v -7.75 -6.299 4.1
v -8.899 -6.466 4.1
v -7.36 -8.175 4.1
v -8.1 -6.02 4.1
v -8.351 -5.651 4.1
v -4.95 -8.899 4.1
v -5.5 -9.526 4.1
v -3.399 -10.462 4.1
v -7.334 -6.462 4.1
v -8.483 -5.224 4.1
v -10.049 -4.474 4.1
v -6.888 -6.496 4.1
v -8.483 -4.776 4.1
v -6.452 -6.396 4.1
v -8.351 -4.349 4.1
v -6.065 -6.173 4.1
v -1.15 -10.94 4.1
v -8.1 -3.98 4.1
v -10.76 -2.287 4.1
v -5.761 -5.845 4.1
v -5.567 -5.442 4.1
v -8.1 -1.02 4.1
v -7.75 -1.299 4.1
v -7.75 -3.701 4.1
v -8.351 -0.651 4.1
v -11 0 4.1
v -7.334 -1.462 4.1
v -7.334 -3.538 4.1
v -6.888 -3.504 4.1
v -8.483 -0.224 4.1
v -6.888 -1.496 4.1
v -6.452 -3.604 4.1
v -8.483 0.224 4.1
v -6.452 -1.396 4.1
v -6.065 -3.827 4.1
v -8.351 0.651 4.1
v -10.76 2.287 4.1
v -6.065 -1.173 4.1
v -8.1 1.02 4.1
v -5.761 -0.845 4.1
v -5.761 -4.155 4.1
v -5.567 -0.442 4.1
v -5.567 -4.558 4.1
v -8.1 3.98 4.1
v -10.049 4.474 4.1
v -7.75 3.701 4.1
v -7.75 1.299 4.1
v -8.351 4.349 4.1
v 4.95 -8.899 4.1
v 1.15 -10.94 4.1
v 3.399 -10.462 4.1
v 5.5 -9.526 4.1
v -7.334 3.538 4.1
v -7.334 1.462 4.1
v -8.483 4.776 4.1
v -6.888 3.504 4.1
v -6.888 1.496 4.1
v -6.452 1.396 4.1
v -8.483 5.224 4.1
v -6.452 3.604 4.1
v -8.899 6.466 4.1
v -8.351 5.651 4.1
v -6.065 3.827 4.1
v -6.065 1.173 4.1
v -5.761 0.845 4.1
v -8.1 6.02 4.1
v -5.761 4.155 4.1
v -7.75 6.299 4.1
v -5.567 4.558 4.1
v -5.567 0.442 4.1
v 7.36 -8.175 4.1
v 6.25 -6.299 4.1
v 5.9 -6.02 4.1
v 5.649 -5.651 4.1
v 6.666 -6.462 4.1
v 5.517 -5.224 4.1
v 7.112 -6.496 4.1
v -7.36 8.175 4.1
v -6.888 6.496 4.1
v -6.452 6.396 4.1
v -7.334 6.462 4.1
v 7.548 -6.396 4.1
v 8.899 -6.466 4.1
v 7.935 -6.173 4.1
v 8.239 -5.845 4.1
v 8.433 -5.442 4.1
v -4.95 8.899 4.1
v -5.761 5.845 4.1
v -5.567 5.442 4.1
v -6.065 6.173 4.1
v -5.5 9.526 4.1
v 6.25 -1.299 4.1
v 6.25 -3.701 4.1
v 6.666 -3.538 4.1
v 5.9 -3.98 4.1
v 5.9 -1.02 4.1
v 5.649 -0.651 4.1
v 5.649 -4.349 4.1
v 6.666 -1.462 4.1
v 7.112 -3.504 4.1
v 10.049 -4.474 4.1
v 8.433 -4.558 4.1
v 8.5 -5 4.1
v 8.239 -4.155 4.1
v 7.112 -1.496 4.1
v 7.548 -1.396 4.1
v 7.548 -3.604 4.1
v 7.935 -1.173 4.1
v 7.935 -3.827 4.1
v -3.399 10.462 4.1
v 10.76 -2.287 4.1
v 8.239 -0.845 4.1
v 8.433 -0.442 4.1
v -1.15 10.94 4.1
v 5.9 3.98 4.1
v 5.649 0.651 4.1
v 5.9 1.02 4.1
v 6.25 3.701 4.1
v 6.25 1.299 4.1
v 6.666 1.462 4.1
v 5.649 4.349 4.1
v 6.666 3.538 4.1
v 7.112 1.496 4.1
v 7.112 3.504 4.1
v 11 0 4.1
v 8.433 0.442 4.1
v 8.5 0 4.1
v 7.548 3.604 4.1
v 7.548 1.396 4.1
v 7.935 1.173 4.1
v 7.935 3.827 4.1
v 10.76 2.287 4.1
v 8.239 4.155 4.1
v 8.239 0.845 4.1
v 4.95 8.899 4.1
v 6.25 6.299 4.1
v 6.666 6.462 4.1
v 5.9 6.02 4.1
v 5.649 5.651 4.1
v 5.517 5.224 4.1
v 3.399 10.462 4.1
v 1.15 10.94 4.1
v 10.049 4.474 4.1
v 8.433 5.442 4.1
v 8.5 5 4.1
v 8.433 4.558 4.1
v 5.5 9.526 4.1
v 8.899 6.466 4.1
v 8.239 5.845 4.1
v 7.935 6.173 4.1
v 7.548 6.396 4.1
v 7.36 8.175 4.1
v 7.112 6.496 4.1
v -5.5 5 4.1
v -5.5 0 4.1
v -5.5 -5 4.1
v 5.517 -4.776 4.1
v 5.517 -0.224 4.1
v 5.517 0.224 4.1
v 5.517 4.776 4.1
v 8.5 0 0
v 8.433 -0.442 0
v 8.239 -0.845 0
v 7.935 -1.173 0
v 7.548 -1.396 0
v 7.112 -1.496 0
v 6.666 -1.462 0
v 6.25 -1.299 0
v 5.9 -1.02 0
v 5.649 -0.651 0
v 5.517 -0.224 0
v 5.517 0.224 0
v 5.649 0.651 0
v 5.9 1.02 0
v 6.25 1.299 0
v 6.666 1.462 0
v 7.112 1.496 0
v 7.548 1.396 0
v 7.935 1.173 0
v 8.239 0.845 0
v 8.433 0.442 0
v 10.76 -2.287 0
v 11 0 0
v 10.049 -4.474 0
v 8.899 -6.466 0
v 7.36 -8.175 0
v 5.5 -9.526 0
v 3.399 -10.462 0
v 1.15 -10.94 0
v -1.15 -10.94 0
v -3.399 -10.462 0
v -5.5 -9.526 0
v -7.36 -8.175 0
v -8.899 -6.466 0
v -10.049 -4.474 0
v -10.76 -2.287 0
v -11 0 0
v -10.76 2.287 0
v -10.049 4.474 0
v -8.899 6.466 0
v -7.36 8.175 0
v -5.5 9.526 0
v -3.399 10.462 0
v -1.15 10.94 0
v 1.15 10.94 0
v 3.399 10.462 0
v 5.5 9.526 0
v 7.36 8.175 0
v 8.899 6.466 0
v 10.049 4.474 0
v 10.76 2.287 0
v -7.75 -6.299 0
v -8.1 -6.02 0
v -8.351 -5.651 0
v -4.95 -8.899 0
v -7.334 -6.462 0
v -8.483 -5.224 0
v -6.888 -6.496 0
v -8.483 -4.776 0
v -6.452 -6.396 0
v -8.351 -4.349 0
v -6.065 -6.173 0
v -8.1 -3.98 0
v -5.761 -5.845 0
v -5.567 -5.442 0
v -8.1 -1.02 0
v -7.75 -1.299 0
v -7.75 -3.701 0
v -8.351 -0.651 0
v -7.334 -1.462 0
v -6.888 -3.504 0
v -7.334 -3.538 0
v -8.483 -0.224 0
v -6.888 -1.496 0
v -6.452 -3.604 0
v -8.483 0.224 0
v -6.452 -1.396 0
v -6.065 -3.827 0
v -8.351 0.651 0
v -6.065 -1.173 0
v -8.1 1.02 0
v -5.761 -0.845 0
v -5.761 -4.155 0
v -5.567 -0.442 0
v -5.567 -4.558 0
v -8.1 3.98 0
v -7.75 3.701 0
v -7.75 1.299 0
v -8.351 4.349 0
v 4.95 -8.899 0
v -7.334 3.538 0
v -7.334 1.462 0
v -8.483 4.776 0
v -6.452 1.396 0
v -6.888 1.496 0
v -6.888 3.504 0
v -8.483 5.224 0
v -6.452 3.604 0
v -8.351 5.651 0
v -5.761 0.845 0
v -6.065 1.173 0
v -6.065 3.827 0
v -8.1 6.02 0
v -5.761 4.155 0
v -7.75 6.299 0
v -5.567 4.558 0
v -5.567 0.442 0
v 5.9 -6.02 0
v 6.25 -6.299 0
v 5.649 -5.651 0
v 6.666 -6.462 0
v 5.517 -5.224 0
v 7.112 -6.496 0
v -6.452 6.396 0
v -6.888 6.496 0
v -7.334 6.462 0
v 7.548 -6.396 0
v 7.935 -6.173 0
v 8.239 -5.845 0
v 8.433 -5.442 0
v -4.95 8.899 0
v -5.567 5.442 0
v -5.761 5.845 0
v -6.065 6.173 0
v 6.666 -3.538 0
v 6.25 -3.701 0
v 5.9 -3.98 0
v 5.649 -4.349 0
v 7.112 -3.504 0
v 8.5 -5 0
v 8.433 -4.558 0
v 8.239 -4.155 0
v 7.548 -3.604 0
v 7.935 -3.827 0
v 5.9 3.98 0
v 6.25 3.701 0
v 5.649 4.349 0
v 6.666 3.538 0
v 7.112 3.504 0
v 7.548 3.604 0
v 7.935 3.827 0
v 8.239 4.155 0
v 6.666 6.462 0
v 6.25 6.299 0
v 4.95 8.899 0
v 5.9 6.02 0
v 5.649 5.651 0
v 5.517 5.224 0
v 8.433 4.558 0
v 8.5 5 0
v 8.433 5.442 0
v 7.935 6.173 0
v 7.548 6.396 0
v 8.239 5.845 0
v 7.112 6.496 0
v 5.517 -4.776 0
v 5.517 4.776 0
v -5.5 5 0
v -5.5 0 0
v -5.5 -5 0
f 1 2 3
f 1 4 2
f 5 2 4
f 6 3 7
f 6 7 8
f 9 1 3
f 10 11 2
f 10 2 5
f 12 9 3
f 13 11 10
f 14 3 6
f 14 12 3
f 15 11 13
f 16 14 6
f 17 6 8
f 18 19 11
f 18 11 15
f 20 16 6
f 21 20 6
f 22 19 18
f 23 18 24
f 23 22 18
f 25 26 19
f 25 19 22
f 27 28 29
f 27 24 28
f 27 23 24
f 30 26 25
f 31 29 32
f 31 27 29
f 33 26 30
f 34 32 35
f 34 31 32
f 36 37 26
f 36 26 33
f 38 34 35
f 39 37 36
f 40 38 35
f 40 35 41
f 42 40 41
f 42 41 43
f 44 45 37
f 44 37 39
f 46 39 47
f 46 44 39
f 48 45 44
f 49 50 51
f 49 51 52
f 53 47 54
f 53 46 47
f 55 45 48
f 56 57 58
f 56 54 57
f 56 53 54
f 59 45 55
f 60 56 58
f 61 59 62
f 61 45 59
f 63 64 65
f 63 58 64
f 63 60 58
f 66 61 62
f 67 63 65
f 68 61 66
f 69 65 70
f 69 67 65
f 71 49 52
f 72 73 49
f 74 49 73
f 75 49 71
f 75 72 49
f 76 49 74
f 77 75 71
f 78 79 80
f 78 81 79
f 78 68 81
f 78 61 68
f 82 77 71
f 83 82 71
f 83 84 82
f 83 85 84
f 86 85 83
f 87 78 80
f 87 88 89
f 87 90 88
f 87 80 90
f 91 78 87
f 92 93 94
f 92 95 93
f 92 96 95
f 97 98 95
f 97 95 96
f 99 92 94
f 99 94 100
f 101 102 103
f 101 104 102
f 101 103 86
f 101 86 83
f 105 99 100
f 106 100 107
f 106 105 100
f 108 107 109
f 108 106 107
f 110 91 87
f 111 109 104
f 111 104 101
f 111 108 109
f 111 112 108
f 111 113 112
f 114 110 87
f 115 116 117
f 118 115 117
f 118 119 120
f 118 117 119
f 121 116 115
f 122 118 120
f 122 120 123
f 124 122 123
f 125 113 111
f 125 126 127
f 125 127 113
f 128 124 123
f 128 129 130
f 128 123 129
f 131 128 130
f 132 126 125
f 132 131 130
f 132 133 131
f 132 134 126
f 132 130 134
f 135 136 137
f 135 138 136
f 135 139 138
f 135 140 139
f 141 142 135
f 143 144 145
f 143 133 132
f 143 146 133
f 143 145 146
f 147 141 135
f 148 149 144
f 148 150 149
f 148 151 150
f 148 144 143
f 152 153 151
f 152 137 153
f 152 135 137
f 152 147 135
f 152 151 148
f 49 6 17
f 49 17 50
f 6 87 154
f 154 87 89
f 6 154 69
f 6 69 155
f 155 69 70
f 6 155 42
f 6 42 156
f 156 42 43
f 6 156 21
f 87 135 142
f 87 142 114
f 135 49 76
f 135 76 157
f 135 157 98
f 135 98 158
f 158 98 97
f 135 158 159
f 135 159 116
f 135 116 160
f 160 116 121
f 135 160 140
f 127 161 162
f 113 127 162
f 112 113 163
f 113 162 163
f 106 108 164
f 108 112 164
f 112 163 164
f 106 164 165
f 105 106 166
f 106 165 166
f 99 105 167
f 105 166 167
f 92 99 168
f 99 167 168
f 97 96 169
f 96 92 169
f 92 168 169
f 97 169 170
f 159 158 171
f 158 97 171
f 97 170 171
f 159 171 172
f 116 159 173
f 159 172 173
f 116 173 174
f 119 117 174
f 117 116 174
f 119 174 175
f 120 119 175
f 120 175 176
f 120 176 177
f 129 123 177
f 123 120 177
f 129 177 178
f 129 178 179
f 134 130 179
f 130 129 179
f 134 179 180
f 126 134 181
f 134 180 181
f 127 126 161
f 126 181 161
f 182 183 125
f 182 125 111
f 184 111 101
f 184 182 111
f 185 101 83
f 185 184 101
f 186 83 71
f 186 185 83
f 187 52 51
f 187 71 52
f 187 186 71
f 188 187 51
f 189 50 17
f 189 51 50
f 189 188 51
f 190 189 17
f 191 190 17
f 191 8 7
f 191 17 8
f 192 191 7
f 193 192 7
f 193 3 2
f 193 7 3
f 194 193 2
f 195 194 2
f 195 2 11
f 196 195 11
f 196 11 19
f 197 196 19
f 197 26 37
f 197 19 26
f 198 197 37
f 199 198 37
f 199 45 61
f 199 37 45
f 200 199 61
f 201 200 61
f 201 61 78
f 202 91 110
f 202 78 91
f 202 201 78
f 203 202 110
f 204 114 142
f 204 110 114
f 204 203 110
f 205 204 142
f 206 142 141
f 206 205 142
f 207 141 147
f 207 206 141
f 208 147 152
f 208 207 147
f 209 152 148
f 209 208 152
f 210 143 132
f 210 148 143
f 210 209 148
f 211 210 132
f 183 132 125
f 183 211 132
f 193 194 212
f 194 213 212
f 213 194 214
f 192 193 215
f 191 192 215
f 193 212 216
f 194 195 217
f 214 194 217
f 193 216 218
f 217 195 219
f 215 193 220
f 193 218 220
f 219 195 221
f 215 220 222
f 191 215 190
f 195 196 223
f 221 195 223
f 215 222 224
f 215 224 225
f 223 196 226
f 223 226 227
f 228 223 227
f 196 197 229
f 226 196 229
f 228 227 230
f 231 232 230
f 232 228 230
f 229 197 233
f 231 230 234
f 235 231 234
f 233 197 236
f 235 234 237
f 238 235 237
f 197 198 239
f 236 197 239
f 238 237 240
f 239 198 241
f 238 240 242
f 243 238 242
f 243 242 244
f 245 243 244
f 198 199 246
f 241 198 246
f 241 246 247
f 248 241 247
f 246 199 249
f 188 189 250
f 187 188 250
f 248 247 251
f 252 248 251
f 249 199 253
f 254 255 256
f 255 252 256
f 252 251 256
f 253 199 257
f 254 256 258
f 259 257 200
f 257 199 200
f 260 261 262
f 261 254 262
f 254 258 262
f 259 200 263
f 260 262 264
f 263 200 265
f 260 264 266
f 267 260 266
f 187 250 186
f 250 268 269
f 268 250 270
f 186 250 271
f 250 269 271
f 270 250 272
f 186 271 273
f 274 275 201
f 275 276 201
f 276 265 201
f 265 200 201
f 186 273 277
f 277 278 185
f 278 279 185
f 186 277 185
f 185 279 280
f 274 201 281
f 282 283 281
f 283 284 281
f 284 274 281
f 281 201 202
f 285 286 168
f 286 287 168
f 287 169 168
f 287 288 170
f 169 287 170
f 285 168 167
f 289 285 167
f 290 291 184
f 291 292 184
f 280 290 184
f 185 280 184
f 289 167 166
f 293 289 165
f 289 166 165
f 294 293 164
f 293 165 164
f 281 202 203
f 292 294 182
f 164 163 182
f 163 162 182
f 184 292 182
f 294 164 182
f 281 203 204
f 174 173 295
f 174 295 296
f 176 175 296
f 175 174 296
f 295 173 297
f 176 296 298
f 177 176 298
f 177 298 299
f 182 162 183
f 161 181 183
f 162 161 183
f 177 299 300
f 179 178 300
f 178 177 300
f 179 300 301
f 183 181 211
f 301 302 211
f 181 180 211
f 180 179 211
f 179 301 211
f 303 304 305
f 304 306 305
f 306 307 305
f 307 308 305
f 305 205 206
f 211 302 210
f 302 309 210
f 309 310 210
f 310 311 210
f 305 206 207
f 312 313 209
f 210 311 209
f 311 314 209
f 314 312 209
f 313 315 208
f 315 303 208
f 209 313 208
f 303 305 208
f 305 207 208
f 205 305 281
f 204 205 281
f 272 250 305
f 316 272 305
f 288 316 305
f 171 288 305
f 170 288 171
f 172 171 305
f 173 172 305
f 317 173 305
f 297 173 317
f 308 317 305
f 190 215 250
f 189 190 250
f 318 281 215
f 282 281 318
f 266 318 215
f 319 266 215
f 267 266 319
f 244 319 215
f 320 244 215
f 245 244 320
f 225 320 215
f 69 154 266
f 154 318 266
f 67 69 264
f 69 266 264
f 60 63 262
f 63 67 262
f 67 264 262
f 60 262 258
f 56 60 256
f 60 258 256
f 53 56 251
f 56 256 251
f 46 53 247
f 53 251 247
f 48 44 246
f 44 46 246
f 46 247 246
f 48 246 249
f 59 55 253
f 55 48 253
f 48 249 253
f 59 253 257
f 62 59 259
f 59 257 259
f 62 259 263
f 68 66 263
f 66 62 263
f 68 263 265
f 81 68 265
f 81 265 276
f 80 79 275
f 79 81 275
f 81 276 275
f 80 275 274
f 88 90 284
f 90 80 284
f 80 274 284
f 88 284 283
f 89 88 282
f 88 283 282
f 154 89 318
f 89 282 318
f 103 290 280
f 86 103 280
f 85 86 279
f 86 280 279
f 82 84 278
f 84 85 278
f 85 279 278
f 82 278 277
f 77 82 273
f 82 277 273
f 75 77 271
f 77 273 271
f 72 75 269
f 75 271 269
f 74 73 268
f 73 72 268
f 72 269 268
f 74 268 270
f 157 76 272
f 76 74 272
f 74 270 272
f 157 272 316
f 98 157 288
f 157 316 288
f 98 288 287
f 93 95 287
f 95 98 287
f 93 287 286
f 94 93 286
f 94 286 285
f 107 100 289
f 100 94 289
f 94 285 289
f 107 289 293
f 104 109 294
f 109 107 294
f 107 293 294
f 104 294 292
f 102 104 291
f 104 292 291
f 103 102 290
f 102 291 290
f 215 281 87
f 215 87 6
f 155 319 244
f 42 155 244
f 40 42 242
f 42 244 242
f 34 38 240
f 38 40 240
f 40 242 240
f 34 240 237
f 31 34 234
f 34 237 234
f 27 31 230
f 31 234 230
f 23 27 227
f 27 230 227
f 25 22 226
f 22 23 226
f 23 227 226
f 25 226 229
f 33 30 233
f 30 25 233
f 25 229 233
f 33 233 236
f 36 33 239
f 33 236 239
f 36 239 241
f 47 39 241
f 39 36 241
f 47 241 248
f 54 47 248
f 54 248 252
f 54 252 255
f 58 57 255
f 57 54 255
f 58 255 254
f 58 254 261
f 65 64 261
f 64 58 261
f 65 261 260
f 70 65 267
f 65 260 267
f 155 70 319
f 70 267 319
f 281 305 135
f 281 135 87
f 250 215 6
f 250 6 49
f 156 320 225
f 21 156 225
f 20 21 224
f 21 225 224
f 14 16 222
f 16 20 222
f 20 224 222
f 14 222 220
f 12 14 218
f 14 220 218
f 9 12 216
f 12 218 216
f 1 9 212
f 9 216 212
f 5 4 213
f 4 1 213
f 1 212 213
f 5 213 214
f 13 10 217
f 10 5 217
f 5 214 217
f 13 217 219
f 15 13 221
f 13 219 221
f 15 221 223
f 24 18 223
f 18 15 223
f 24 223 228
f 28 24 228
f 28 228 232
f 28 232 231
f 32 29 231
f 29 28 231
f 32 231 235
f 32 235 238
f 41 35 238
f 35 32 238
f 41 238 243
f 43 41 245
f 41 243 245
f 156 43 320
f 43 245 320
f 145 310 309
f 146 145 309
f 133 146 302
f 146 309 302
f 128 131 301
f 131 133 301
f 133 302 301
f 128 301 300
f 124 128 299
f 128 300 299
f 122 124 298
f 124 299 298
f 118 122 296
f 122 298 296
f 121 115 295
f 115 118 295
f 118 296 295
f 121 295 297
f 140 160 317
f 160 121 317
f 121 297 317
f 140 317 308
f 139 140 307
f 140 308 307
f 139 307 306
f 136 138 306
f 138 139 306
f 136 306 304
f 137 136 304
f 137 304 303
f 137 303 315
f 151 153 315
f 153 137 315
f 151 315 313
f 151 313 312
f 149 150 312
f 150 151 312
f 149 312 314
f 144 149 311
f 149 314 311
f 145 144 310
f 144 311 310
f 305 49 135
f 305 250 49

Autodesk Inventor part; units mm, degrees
ref_plane "YZ Plane" through (0, 0, 0) normal (1, 0, 0) x (0, 1, 0)
ref_plane "XZ Plane" through (0, 0, 0) normal (0, 1, 0) x (-1, 0, 0)
ref_plane "XY Plane" through (0, 0, 0) normal (0, 0, 1) x (1, 0, 0)
sketch "Sketch3" plane through (0, 0, 0) normal (0, 0, 1) x (1, 0, 0)
  line L0 (-15.8918, -16.7) -> (15.8918, -16.7)
  line L1 (16.7, -15.7) -> (16.7, 15.7)
  line L2 (15.8918, 16.7) -> (-15.8918, 16.7)
  line L3 (-16.7, 15.7) -> (-16.7, -15.7)
  line L4 (-15.8918, 16.7) -> (-16.7, 15.7)
  line L5 (15.8918, 16.7) -> (16.7, 15.7)
  line L6 (16.7, -15.7) -> (15.8918, -16.7)
  line L7 (-16.7, -15.7) -> (-15.8918, -16.7)
  line L8 (-4.9497, -8.8994) -> (4.9497, -8.8994)
  line L9 (4.9497, -8.8994) -> (4.9497, 8.8994)
  line L10 (4.9497, 8.8994) -> (-4.9497, 8.8994)
  line L11 (-4.9497, 8.8994) -> (-4.9497, -8.8994)
  circle A0 centre (-12.14, 12.625) radius 2.045
  circle A1 centre (12.14, 12.625) radius 2.045
  line L12 (0, -16.7) -> (0, 16.7) construction
  circle A2 centre (-12.14, -12.625) radius 2.045
  circle A3 centre (12.14, -12.625) radius 2.045
  line L13 (12.14, 12.625) -> (-12.14, 12.625) construction
  line L14 (-12.14, 12.625) -> (-12.14, -12.625) construction
  line L15 (-12.14, -12.625) -> (12.14, -12.625) construction
  line L16 (12.14, -12.625) -> (12.14, 12.625) construction
  line L17 (-16.7, 0) -> (16.7, 0) construction
  circle A4 centre (0, 0) radius 18.4 construction
  circle A5 centre (-7, 0) radius 1.5
  circle A6 centre (7, 0) radius 1.5
  circle A7 centre (-7, 5) radius 1.5
  circle A8 centre (7, 5) radius 1.5
  circle A9 centre (-7, -5) radius 1.5
  circle A10 centre (7, -5) radius 1.5
  dimension "d10" = 9.8994
  dimension "d11" = 17.7988
  dimension "d12" = 4.09
  dimension "d13" = 4.09
  dimension "d17" = 4.09
  dimension "d19" = 24.28
  dimension "d20" = 25.25
  dimension "d21" = 4.09
  dimension "d22" = 12.625
  dimension "d26" = 36.8
  dimension "d38" = 12.14
  dimension "d39" = 33.4
  dimension "d40" = 33.4
  dimension "d41" = 3
  dimension "d42" = 3
  dimension "d43" = 7
  dimension "d44" = 7
  dimension "d45" = 3
  dimension "d46" = 3
  dimension "d47" = 3
  dimension "d48" = 3
  dimension "d49" = 5
  dimension "d50" = 5
  dimension "d51" = 5
  dimension "d52" = 5
  dimension "d57" = 8.8994
  dimension "d58" = 4.9497
sketch "Sketch4" plane through (0, 0, 0) normal (0, 0, 1) x (1, 0, 0)
  circle A0 centre (0, 0) radius 11
  dimension "d32" = 22
extrude "Extrusion5" add sketch "Sketch3" along normal blind 4.1
extrude "Extrusion6" cut sketch "Sketch4" along normal blind 4.1 keep common part
properties part number "WG18FLANGECutDown" material "Brass, Soft Yellow"
